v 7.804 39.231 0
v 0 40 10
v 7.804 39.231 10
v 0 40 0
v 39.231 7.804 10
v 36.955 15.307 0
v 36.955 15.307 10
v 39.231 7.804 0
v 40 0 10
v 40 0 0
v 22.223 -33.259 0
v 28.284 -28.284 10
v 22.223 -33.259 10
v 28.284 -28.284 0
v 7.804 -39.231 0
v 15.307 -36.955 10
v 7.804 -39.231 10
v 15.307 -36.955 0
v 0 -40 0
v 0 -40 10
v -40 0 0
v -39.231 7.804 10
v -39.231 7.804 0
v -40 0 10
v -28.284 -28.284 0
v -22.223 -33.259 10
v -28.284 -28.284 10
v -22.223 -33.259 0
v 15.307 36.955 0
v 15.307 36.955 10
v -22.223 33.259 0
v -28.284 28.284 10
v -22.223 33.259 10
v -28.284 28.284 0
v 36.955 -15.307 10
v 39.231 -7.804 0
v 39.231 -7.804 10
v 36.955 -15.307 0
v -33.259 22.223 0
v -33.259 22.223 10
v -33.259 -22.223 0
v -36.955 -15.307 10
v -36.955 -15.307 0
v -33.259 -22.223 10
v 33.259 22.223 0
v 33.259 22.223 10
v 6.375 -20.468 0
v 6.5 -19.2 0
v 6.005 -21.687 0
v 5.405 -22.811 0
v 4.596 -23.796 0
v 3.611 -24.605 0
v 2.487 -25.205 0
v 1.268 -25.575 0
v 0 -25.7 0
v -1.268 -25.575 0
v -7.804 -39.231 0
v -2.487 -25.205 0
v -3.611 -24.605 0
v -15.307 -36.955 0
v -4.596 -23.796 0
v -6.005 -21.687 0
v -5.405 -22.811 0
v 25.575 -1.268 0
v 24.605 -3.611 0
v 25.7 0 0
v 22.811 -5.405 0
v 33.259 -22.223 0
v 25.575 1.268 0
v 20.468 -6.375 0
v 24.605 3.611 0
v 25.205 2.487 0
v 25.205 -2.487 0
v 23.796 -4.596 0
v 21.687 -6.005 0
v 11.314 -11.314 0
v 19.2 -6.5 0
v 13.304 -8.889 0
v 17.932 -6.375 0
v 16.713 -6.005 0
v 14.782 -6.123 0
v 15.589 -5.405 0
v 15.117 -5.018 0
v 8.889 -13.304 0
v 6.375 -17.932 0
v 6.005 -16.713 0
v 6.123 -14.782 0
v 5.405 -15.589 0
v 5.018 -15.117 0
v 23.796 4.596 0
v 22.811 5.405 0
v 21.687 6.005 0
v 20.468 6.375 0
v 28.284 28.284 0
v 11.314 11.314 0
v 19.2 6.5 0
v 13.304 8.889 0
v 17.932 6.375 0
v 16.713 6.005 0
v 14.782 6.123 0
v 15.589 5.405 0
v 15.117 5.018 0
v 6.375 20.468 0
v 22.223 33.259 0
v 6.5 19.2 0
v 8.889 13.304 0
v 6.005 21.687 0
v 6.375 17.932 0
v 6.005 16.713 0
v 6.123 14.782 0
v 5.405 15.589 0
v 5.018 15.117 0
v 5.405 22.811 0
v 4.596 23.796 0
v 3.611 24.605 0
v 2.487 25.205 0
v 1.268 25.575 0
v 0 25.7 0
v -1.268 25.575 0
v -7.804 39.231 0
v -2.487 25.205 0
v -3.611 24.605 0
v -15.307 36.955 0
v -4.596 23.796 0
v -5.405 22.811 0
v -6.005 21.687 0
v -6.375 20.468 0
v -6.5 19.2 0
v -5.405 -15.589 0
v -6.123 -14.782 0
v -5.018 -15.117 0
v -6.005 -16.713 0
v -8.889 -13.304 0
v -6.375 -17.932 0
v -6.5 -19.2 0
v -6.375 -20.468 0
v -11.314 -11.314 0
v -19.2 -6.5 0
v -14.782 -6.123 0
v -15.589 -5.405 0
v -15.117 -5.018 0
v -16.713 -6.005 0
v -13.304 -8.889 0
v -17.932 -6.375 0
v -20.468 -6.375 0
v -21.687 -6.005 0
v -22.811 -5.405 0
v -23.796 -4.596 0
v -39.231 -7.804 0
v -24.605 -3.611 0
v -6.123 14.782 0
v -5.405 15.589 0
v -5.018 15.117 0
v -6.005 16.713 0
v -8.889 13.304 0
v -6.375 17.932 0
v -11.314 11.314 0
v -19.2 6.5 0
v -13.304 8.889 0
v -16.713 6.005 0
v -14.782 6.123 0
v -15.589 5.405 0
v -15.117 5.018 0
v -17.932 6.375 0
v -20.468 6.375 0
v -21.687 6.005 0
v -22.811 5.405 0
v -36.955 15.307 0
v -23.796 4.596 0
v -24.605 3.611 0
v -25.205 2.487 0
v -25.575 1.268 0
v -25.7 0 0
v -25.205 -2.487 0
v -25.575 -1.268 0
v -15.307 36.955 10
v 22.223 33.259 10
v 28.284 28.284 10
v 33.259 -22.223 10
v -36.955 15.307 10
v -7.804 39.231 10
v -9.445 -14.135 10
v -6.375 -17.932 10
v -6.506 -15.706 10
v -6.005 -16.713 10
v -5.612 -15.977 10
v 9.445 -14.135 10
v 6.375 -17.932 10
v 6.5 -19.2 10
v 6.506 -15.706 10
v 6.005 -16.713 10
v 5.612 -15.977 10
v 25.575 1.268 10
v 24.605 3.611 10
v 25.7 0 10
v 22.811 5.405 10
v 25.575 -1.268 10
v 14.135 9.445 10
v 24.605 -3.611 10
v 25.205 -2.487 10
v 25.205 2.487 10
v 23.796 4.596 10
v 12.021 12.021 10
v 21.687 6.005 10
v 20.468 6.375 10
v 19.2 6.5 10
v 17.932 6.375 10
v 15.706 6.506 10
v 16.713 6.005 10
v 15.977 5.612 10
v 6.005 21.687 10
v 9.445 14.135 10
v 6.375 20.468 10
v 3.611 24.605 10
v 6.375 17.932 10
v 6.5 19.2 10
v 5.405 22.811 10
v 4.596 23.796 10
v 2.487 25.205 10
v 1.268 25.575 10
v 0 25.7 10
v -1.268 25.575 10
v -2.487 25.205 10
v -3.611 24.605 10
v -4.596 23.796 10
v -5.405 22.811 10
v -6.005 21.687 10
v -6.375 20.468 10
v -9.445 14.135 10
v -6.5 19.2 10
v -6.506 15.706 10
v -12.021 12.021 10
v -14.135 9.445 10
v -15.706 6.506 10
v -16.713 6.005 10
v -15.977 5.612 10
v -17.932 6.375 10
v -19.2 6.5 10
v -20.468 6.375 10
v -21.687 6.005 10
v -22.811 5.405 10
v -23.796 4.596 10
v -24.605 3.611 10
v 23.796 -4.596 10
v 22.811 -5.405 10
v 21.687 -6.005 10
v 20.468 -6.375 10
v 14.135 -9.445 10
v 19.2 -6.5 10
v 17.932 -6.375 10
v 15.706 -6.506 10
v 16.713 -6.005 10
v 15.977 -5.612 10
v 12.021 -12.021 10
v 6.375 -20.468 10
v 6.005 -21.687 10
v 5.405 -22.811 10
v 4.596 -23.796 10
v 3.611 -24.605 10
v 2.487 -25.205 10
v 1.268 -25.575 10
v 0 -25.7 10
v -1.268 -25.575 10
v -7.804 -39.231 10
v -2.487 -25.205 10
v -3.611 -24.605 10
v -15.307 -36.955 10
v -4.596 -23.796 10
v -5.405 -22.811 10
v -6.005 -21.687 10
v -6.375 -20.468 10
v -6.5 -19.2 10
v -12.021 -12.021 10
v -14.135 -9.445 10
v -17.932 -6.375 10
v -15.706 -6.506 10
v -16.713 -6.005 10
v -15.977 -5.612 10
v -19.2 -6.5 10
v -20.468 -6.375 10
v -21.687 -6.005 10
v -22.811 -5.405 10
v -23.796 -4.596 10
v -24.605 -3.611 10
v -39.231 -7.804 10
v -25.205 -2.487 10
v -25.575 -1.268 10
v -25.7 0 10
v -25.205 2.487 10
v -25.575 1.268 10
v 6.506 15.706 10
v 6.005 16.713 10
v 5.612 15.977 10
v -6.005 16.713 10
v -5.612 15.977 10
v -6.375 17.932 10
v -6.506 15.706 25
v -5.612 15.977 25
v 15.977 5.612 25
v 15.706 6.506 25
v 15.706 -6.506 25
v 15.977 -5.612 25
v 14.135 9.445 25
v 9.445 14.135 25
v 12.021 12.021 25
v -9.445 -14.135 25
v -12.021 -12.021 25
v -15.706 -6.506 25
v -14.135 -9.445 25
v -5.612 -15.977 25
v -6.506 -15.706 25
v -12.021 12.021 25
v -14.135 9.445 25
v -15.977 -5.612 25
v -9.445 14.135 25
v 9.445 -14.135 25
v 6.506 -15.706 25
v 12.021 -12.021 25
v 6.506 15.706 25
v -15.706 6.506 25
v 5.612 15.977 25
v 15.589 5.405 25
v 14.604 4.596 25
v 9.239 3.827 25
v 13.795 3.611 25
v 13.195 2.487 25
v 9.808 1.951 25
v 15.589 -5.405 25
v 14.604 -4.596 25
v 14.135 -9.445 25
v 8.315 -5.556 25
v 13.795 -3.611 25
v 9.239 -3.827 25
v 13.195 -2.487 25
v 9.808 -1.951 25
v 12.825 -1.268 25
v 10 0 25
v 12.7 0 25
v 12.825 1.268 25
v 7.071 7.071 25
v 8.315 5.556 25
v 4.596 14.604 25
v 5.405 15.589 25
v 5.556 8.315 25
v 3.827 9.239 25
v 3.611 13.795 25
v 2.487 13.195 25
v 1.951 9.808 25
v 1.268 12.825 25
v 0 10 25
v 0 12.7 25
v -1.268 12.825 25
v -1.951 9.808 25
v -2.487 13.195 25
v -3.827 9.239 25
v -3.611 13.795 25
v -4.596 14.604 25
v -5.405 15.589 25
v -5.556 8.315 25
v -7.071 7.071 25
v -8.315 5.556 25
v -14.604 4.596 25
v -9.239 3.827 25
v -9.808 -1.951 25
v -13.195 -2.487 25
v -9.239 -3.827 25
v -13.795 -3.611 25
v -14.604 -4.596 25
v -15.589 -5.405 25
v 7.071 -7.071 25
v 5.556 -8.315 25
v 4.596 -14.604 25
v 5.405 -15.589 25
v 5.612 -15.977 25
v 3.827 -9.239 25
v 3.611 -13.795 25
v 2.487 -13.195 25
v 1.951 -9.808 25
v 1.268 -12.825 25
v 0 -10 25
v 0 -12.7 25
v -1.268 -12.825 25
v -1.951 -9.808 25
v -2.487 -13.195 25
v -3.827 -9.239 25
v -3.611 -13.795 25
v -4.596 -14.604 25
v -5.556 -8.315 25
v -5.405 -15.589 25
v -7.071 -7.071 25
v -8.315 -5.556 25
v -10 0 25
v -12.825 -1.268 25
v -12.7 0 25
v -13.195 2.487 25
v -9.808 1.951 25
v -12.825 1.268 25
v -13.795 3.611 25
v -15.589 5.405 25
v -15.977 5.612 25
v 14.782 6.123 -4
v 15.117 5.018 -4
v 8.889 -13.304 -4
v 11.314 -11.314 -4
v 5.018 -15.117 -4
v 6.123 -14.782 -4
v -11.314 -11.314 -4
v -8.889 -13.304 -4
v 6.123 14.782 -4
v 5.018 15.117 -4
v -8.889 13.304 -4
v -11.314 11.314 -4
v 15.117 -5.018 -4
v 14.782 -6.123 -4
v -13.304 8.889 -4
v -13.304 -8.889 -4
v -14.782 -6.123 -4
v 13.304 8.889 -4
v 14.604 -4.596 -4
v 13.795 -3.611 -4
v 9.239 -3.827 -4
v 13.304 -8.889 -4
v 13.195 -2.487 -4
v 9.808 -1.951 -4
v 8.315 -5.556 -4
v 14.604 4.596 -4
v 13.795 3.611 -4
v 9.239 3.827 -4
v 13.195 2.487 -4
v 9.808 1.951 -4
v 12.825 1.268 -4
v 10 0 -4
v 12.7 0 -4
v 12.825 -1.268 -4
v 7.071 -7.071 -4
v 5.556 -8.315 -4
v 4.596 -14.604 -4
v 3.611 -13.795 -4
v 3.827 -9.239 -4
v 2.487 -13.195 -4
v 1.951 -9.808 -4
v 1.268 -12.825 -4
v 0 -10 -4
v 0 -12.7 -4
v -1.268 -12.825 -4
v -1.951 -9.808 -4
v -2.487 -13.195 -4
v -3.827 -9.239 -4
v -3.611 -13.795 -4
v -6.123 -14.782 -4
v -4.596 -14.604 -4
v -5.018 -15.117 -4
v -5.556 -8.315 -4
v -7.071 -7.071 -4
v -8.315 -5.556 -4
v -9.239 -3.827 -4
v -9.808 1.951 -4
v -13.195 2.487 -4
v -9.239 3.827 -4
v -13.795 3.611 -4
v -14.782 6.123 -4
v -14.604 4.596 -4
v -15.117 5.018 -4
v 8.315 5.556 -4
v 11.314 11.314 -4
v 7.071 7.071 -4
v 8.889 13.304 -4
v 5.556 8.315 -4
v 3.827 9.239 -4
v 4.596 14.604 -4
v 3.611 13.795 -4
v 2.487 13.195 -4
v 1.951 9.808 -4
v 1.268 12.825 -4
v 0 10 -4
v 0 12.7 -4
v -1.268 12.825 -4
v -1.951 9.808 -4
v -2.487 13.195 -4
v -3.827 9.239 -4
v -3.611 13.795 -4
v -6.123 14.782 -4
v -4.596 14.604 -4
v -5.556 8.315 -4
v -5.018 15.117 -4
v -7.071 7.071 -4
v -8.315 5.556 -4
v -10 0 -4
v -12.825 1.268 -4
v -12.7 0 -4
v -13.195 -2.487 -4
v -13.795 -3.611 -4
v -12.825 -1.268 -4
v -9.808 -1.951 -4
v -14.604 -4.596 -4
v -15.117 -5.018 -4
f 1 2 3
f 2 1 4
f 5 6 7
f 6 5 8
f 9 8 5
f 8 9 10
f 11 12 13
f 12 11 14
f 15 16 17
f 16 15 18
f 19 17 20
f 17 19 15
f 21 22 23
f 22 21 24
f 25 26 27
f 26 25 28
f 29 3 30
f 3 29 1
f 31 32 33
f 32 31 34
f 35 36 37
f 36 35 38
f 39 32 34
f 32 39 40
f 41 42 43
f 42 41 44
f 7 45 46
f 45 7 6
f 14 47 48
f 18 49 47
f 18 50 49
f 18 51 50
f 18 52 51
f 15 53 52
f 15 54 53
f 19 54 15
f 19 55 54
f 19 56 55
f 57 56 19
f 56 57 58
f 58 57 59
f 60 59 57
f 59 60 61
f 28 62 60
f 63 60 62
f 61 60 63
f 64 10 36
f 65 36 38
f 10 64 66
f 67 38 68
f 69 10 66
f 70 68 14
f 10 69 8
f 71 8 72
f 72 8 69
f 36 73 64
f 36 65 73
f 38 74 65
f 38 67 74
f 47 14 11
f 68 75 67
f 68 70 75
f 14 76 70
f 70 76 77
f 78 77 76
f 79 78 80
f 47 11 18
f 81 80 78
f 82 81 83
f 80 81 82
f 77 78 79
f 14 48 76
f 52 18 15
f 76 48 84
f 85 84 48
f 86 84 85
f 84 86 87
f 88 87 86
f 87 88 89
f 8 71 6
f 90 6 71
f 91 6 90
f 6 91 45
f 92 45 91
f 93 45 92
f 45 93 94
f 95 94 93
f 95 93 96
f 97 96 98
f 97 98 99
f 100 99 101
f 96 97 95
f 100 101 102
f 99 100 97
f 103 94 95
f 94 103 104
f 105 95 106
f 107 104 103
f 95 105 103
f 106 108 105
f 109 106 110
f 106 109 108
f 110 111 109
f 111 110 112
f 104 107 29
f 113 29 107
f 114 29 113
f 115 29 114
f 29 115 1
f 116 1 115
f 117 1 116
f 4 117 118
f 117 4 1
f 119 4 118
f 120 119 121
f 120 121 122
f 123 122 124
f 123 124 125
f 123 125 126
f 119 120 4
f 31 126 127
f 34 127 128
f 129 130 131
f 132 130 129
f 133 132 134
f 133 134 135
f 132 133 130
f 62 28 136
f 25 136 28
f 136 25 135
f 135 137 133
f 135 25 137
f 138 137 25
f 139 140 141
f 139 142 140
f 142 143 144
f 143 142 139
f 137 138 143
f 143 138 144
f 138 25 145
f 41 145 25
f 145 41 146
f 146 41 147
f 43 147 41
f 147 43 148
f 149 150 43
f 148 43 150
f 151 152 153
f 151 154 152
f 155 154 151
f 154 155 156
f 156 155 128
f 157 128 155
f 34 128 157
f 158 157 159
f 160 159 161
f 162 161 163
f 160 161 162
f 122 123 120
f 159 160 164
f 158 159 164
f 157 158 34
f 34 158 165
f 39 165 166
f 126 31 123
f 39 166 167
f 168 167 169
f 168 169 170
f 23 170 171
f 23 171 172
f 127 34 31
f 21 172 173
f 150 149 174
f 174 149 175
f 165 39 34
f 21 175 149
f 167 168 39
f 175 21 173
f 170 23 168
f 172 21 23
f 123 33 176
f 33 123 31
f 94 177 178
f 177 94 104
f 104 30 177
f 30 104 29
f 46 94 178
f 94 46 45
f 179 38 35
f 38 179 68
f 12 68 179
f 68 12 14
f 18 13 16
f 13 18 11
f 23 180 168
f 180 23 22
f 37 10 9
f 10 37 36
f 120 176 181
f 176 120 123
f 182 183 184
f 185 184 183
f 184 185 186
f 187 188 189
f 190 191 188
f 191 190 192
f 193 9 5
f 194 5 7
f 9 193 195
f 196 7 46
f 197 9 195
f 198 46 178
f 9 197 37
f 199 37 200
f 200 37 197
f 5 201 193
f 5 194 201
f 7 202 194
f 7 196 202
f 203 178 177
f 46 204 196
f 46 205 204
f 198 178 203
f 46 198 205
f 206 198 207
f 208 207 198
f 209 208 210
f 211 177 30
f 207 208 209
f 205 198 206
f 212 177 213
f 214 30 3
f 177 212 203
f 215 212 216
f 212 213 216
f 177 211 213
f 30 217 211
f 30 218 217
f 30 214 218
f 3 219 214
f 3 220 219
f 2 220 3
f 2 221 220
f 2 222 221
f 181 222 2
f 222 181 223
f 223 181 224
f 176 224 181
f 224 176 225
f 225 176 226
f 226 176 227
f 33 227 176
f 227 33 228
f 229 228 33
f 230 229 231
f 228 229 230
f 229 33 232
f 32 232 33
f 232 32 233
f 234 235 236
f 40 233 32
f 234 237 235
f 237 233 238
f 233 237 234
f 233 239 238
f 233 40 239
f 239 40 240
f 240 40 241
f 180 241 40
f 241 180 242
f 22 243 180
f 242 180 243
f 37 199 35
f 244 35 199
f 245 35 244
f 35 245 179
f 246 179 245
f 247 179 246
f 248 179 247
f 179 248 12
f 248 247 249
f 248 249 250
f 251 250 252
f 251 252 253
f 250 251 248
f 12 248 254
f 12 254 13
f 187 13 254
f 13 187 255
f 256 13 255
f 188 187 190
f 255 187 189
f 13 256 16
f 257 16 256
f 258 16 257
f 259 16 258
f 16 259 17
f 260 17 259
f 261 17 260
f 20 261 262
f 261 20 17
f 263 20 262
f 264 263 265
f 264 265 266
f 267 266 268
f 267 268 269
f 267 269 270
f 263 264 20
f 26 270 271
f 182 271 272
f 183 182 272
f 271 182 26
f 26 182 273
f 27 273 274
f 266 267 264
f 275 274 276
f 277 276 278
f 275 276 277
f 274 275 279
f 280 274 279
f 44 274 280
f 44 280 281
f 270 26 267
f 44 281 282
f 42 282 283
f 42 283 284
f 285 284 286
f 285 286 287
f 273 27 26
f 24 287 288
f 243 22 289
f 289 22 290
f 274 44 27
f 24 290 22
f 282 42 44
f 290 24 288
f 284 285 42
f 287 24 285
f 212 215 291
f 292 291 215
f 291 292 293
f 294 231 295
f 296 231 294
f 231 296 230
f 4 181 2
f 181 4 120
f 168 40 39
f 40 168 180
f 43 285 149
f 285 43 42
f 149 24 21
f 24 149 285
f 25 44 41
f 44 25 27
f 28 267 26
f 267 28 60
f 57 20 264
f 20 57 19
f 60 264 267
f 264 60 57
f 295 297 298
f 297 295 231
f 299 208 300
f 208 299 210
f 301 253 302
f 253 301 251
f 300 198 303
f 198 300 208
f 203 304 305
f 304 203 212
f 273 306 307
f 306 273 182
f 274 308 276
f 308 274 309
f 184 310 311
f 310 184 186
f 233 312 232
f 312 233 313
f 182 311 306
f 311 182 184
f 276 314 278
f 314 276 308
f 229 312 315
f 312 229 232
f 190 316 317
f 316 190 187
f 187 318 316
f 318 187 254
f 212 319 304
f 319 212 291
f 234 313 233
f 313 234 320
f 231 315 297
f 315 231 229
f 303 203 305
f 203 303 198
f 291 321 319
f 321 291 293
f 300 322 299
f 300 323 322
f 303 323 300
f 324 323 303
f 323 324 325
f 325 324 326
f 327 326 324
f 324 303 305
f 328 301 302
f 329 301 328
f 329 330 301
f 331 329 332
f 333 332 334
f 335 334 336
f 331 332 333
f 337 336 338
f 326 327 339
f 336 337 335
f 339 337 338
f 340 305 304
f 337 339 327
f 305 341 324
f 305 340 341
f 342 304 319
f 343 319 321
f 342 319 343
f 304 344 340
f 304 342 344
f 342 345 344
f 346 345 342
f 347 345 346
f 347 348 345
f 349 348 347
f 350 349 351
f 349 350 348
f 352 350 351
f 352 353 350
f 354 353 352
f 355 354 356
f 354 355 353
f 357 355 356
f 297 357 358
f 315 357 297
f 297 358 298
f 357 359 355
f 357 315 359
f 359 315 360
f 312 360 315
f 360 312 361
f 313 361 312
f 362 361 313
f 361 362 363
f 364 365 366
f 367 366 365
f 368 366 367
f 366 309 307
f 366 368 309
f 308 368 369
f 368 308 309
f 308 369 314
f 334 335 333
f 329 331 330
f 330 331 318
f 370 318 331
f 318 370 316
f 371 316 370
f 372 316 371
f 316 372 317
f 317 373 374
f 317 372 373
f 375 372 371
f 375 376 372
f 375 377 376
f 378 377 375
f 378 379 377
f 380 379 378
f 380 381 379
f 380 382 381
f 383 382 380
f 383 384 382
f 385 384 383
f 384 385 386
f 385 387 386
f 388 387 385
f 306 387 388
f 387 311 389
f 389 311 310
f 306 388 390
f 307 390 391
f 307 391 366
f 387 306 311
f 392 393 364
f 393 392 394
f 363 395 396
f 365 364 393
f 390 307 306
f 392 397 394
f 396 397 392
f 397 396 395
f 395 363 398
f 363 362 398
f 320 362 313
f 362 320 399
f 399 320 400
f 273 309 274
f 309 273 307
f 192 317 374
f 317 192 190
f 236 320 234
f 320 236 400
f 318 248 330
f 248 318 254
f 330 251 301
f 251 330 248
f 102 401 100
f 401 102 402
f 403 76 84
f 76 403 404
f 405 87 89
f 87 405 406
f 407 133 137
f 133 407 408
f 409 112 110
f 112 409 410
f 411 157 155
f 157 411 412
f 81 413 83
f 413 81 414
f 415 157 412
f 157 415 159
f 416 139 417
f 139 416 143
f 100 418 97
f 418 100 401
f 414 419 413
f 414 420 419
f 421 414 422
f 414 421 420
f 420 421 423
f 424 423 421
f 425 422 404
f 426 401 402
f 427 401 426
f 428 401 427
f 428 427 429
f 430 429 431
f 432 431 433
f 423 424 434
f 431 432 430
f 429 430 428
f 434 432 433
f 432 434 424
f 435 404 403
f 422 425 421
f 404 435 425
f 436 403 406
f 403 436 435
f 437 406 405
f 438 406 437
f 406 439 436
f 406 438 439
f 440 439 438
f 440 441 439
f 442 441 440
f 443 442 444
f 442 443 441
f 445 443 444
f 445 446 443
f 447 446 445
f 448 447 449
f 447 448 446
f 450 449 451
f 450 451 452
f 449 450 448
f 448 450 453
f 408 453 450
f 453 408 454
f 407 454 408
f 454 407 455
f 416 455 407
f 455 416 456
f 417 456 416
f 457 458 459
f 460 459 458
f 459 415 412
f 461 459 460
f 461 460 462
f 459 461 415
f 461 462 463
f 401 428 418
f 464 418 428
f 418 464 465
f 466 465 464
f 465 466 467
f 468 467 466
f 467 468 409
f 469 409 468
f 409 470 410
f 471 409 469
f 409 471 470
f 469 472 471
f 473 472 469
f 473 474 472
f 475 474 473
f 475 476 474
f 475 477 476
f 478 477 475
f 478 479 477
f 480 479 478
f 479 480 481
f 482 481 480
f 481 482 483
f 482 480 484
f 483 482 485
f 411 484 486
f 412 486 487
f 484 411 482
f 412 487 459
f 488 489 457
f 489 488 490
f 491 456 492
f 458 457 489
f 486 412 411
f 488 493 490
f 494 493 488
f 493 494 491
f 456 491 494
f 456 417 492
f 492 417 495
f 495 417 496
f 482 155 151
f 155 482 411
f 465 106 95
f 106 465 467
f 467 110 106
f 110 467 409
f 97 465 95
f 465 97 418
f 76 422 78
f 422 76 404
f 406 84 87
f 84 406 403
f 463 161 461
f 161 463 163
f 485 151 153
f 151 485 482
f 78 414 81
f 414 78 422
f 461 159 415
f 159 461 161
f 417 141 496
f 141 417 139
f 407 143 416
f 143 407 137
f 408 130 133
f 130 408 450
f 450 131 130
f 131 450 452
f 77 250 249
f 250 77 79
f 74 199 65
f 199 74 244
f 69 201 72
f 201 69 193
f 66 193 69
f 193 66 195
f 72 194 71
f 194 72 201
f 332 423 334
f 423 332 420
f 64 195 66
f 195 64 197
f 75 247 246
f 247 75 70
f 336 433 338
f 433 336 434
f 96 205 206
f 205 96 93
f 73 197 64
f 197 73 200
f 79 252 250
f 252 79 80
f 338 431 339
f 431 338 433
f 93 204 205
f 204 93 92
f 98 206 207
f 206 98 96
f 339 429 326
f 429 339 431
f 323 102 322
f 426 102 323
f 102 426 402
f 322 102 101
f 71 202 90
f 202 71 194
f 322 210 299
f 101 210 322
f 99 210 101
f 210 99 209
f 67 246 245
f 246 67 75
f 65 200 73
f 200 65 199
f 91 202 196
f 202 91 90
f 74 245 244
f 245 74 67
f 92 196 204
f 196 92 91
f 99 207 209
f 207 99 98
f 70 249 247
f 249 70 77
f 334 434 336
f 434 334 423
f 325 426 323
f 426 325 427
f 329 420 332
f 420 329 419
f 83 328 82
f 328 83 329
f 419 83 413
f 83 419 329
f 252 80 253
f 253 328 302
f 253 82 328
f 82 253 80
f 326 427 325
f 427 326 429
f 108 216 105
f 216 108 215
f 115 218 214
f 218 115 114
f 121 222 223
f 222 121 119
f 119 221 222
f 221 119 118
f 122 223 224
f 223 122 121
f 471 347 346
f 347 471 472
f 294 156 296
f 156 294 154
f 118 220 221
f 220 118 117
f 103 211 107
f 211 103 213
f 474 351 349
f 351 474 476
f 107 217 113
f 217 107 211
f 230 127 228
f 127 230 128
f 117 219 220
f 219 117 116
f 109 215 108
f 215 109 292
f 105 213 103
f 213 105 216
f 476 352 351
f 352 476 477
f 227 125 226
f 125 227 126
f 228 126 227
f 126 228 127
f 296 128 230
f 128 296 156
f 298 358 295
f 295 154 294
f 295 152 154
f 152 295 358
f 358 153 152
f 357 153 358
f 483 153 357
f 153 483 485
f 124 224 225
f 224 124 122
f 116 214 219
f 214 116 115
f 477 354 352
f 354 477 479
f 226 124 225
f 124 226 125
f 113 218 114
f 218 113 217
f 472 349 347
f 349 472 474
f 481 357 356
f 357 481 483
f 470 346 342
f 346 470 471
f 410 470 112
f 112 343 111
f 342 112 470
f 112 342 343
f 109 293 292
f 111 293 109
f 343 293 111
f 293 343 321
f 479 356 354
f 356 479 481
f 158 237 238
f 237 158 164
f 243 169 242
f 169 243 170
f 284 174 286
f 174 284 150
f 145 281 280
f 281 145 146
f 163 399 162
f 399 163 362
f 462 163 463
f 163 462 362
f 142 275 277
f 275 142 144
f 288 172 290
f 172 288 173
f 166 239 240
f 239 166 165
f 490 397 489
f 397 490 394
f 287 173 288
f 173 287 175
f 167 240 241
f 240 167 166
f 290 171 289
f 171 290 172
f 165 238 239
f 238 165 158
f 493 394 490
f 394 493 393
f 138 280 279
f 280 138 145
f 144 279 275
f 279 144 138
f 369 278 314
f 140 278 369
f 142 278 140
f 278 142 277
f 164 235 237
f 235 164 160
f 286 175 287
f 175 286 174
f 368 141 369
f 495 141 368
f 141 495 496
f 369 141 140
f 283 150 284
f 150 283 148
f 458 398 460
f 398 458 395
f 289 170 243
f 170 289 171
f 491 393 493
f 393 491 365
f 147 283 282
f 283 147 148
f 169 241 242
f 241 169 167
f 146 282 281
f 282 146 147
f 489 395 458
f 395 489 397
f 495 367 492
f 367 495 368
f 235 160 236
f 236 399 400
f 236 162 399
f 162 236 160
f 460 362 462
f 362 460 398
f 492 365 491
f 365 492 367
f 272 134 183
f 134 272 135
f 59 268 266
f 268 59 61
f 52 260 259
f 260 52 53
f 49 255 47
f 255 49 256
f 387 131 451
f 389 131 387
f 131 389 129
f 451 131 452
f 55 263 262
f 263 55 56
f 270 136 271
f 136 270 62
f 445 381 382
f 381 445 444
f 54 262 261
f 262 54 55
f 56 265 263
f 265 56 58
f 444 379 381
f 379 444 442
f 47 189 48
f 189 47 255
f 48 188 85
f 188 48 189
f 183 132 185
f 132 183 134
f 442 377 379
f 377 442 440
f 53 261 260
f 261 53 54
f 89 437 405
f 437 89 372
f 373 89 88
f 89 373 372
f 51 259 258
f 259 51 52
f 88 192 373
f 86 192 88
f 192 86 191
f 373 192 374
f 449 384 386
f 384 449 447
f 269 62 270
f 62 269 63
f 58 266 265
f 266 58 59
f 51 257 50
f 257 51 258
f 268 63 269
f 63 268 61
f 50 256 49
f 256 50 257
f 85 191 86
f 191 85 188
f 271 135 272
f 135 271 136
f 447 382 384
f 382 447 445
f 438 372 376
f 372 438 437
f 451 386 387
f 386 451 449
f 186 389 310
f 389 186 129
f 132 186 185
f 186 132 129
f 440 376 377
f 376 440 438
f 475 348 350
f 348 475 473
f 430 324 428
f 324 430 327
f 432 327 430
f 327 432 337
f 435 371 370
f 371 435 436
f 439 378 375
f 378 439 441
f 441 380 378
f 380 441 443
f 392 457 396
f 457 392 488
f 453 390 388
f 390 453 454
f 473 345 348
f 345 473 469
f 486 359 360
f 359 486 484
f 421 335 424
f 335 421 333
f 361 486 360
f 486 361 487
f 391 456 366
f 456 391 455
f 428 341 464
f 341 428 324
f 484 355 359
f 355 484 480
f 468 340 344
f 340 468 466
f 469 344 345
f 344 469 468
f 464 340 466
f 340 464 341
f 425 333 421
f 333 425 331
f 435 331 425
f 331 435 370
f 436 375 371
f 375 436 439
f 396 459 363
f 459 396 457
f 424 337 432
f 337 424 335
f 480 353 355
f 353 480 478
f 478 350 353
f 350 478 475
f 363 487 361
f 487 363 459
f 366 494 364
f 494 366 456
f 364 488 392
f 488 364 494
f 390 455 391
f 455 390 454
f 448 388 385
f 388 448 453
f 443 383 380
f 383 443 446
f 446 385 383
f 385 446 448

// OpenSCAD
$fn = 32;

// ----------------------------------------------------------------------
// Bolt-circle flange: 80 mm outside, 4 bolt holes, bore 20 mm
// ----------------------------------------------------------------------

// --- parameters (mm) ---
flange_d = 80;            // flange outside diameter
flange_t = 10;            // flange thickness
bolts = 4;                // number of bolt holes
bolt_d = 13;              // bolt clearance
bolt_r = 19.2;            // bolt circle radius
bore_d = 20;              // centre bore
hub_d = 34;               // raised hub diameter
hub_h = 15;               // raised hub height
spigot_d = 32;            // spigot diameter
spigot_h = 5;             // spigot height below the flange
sink = 1;                 // overlap into the flange

module body() {
  cylinder(h = flange_t, d = flange_d);
  /* raised hub, sunk 1 mm into the flange */
  translate([0, 0, flange_t - 1]) cylinder(h = hub_h + 1, d = hub_d);
  /* spigot on the back face, sunk into the flange */
  translate([0, 0, -spigot_h + sink]) cylinder(h = spigot_h, d = spigot_d);
}

difference() {
  body();
  /* bolt circle */
  for (i = [0 : bolts - 1]) rotate([0, 0, i * 360 / bolts]) translate([bolt_r, 0, -spigot_h - 1]) cylinder(h = flange_t + hub_h + spigot_h + 3, d = bolt_d);
  translate([0, 0, -spigot_h - 1]) cylinder(h = flange_t + hub_h + spigot_h + 3, d = bore_d);
}
